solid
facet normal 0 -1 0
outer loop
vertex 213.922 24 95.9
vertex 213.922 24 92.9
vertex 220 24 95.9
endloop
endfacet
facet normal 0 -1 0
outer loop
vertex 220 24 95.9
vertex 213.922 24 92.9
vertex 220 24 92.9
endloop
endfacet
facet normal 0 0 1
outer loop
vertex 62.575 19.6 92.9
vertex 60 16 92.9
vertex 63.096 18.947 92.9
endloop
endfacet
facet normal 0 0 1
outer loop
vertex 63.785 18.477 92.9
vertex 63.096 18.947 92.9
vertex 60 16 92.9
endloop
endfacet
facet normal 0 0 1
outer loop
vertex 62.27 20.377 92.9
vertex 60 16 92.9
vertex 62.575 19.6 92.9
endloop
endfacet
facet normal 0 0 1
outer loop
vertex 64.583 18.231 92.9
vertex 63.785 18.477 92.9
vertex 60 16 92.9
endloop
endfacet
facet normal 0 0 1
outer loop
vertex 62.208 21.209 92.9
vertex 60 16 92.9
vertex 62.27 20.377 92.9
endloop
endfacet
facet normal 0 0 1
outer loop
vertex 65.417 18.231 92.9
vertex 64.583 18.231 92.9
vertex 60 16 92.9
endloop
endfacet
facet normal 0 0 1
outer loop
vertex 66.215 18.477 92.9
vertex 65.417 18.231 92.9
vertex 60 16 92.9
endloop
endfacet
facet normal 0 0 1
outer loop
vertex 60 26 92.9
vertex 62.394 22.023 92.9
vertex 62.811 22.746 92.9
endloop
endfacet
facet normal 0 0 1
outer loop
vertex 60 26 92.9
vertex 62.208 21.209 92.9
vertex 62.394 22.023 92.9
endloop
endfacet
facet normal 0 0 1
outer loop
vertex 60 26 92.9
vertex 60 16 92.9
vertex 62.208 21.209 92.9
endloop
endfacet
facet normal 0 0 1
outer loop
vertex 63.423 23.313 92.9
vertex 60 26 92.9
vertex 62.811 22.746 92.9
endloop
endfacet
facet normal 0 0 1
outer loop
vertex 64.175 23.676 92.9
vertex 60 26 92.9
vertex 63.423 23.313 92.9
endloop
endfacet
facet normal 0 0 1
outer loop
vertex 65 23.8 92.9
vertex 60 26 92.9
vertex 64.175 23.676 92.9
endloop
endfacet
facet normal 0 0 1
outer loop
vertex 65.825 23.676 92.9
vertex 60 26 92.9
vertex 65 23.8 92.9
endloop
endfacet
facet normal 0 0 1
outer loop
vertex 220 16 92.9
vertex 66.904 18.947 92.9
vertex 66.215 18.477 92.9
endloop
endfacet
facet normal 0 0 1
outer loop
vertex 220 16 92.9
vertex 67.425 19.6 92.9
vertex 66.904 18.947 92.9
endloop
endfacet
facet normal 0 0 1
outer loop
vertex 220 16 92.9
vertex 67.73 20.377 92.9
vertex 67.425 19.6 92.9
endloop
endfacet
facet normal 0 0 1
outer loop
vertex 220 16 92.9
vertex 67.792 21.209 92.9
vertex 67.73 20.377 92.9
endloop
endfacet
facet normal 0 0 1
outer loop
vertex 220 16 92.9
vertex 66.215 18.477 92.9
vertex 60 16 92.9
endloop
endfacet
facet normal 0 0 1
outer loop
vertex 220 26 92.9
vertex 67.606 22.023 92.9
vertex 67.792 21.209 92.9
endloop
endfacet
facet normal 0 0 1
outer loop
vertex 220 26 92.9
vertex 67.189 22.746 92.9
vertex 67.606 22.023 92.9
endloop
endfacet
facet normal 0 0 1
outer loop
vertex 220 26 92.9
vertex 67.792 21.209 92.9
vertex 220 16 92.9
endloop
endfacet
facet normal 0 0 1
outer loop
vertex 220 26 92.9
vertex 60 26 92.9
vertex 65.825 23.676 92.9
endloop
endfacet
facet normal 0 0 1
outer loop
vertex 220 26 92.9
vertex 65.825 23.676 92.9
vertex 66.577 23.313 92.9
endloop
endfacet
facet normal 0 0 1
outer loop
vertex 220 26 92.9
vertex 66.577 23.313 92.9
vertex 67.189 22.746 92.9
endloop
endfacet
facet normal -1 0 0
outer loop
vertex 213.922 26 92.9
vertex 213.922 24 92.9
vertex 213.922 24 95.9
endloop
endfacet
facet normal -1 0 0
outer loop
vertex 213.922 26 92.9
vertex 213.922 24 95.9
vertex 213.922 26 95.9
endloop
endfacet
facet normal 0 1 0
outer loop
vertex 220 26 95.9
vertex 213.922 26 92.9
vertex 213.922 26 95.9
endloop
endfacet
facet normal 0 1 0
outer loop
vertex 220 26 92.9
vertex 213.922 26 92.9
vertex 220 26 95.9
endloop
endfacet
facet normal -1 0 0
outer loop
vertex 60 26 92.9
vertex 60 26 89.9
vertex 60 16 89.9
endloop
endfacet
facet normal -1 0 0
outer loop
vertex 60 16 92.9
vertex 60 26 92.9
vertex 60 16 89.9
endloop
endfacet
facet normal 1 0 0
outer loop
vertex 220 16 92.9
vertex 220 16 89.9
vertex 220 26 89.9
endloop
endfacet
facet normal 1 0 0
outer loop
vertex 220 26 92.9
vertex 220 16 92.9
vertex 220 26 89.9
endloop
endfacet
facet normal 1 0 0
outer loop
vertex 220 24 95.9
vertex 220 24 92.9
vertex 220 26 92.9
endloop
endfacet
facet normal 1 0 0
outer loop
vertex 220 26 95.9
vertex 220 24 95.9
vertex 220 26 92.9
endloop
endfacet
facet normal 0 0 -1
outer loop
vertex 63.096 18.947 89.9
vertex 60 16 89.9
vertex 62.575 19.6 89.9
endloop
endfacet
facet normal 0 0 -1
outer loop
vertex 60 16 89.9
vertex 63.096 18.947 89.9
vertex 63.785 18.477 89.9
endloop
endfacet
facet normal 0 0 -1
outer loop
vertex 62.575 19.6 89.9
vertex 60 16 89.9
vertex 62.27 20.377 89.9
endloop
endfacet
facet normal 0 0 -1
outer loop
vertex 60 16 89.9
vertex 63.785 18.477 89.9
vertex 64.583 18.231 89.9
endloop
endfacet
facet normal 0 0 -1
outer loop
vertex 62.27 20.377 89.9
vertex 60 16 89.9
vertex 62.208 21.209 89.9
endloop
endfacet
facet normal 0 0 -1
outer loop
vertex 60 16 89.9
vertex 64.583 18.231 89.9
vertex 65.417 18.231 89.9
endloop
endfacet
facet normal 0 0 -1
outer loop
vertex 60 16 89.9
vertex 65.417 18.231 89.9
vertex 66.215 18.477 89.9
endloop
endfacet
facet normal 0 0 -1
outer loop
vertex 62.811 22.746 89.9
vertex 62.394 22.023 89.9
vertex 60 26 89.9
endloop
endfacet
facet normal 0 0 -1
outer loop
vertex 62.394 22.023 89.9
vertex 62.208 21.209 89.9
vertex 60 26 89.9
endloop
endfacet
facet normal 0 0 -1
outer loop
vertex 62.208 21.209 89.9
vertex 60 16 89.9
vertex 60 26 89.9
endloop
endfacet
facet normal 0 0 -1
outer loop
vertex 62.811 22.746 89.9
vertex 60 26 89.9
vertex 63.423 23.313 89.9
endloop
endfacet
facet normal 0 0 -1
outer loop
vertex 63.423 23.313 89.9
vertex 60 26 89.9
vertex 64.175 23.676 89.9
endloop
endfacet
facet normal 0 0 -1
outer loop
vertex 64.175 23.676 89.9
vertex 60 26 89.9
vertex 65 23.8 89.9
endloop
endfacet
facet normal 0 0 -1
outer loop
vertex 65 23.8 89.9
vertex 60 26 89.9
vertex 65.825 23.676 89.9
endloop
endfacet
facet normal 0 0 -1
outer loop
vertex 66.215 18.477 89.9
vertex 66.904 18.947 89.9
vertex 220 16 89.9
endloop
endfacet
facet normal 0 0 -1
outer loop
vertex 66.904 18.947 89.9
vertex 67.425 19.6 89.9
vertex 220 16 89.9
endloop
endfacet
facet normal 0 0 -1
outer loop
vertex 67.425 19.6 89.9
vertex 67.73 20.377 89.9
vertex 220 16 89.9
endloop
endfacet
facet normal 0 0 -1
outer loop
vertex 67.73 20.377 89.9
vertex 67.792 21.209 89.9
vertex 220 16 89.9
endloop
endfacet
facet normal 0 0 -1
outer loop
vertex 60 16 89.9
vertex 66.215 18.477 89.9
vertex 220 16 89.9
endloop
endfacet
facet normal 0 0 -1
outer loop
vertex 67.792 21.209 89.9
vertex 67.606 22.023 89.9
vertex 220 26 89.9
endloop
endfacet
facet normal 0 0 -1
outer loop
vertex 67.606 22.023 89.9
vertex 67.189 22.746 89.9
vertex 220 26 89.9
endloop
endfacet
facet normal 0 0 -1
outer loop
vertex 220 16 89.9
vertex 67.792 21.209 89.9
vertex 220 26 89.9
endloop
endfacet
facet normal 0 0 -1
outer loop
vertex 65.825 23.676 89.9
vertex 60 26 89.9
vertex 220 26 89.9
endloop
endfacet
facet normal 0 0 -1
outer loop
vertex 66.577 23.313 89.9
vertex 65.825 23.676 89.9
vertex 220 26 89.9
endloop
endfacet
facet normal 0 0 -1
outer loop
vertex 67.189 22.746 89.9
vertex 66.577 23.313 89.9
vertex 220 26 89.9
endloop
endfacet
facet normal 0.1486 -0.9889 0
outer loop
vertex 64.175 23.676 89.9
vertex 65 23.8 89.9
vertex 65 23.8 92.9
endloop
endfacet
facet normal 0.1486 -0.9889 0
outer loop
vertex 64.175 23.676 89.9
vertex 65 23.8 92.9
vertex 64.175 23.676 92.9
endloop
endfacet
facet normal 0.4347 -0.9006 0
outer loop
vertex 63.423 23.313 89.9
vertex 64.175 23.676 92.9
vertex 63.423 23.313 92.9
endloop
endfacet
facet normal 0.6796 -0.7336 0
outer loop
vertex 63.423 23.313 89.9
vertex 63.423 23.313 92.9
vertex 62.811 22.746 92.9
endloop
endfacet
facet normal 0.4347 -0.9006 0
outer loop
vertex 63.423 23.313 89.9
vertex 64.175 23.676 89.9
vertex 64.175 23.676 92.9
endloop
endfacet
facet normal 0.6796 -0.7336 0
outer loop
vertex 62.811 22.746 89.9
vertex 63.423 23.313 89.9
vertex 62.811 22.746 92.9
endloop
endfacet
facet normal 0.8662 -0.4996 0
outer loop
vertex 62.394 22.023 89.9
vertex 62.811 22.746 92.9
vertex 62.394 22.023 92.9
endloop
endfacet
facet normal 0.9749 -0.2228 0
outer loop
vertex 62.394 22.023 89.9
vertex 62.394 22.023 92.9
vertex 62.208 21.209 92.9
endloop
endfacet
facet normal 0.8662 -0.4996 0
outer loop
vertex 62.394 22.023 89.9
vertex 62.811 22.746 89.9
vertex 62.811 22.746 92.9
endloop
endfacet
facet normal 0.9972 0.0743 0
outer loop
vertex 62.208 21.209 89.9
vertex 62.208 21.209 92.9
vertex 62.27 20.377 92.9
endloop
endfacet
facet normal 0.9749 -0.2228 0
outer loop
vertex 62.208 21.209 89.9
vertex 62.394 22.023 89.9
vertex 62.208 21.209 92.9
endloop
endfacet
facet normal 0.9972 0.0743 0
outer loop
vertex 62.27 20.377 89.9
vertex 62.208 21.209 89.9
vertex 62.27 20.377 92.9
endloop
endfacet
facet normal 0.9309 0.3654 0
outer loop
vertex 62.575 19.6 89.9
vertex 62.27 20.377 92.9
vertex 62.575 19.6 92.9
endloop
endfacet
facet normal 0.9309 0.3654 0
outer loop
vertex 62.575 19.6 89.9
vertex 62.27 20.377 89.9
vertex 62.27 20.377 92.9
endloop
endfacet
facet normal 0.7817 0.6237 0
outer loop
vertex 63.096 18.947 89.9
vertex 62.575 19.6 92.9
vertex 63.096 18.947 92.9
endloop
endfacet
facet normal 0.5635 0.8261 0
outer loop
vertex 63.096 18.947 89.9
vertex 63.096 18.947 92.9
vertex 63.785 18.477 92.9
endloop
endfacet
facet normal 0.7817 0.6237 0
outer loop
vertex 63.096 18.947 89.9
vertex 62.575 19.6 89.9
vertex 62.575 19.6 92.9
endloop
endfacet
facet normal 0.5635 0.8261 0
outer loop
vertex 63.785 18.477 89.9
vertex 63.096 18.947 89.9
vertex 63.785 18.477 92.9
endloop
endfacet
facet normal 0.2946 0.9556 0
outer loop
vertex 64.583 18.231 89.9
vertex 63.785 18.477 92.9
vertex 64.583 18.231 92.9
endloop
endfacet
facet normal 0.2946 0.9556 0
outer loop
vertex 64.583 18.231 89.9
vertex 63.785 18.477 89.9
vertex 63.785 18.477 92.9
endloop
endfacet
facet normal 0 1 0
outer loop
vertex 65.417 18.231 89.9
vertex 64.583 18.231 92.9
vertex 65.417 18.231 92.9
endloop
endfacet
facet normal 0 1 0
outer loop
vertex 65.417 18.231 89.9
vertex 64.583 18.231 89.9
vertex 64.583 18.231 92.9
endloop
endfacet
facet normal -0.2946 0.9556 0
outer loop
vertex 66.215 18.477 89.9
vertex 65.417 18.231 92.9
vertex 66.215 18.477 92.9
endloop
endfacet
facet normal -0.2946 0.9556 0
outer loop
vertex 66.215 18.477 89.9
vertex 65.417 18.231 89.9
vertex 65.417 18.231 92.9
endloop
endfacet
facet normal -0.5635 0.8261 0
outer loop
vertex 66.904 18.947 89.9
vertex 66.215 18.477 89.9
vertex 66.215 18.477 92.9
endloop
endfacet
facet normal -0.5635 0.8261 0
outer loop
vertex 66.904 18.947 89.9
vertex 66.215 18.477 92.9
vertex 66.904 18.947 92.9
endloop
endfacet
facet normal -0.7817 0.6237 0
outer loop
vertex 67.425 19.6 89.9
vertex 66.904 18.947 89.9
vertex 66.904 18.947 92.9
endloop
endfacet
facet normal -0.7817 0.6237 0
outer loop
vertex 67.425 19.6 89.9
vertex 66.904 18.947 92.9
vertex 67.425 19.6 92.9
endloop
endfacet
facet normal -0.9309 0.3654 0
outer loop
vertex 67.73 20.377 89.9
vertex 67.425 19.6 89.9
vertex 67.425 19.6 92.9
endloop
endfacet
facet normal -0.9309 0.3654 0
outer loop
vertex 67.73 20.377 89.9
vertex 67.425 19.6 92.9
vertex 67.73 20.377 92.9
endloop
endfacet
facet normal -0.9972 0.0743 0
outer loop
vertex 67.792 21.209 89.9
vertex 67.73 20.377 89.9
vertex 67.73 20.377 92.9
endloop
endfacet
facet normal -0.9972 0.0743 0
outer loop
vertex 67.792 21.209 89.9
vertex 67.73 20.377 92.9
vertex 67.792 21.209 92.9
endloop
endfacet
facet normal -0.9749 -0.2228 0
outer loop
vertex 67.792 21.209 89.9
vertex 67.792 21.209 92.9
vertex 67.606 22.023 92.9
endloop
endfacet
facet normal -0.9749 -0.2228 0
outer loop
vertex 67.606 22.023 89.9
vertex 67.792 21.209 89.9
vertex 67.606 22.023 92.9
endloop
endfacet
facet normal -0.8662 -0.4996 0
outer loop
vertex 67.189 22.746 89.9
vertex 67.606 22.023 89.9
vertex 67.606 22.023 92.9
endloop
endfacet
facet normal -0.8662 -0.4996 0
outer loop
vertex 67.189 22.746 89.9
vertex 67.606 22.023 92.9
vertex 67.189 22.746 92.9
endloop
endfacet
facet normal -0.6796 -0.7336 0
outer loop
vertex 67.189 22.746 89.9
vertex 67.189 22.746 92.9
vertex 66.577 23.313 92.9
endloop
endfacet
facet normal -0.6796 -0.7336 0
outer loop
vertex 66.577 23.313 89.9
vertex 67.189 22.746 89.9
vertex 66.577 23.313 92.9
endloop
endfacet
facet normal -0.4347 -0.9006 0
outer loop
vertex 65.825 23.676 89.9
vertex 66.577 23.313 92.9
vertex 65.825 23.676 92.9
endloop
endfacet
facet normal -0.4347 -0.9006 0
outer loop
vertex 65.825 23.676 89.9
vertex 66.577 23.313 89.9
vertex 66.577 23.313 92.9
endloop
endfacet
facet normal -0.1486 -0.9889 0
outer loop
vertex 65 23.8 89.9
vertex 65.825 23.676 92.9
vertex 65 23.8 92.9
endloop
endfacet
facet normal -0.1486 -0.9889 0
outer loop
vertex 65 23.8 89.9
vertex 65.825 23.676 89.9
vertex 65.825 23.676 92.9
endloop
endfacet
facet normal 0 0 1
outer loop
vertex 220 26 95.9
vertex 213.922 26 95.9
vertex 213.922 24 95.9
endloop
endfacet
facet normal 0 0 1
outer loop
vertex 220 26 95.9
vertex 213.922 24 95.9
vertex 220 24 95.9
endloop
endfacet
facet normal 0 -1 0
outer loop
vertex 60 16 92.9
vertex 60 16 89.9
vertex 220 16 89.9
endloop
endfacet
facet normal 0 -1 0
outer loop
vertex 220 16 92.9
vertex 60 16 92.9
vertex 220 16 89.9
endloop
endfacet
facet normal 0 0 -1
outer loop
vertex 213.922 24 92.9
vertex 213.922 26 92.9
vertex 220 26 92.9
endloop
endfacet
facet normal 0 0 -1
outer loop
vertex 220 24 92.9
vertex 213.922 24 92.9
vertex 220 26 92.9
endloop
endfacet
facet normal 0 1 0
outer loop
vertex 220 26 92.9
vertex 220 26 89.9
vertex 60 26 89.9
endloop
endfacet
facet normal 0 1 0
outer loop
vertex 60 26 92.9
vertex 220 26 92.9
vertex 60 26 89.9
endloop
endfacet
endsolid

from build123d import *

# Parameters (mm, degrees)
BOSS_EXTRUDE1_DEPTH = 3
SKETCH2_W           = 6.077925367
SKETCH2_H           = 2
BOSS_EXTRUDE2_DEPTH = 3


with BuildPart() as part:
    # Sketch1 → Boss-Extrude1 (new body)
    with BuildSketch(Plane.XY.offset(89.9)):
        Polygon((65, 16), (220, 16), (220, 26), (65, 26), (60, 26), (60, 16), align=None)
        with BuildLine():
            ThreePointArc((65, 18.2), (67.8, 21), (65, 23.8))
            ThreePointArc((65, 23.8), (62.2, 21), (65, 18.2))
        make_face(mode=Mode.SUBTRACT)
    extrude(amount=BOSS_EXTRUDE1_DEPTH)


with BuildPart() as body_2:
    # Sketch2 → Boss-Extrude2 (new body)
    with BuildSketch(Plane.XY.offset(92.9)):
        with Locations((216.961037317, 25)):
            Rectangle(SKETCH2_W, SKETCH2_H)
    extrude(amount=BOSS_EXTRUDE2_DEPTH)


solid = Compound([part.part, body_2.part])
